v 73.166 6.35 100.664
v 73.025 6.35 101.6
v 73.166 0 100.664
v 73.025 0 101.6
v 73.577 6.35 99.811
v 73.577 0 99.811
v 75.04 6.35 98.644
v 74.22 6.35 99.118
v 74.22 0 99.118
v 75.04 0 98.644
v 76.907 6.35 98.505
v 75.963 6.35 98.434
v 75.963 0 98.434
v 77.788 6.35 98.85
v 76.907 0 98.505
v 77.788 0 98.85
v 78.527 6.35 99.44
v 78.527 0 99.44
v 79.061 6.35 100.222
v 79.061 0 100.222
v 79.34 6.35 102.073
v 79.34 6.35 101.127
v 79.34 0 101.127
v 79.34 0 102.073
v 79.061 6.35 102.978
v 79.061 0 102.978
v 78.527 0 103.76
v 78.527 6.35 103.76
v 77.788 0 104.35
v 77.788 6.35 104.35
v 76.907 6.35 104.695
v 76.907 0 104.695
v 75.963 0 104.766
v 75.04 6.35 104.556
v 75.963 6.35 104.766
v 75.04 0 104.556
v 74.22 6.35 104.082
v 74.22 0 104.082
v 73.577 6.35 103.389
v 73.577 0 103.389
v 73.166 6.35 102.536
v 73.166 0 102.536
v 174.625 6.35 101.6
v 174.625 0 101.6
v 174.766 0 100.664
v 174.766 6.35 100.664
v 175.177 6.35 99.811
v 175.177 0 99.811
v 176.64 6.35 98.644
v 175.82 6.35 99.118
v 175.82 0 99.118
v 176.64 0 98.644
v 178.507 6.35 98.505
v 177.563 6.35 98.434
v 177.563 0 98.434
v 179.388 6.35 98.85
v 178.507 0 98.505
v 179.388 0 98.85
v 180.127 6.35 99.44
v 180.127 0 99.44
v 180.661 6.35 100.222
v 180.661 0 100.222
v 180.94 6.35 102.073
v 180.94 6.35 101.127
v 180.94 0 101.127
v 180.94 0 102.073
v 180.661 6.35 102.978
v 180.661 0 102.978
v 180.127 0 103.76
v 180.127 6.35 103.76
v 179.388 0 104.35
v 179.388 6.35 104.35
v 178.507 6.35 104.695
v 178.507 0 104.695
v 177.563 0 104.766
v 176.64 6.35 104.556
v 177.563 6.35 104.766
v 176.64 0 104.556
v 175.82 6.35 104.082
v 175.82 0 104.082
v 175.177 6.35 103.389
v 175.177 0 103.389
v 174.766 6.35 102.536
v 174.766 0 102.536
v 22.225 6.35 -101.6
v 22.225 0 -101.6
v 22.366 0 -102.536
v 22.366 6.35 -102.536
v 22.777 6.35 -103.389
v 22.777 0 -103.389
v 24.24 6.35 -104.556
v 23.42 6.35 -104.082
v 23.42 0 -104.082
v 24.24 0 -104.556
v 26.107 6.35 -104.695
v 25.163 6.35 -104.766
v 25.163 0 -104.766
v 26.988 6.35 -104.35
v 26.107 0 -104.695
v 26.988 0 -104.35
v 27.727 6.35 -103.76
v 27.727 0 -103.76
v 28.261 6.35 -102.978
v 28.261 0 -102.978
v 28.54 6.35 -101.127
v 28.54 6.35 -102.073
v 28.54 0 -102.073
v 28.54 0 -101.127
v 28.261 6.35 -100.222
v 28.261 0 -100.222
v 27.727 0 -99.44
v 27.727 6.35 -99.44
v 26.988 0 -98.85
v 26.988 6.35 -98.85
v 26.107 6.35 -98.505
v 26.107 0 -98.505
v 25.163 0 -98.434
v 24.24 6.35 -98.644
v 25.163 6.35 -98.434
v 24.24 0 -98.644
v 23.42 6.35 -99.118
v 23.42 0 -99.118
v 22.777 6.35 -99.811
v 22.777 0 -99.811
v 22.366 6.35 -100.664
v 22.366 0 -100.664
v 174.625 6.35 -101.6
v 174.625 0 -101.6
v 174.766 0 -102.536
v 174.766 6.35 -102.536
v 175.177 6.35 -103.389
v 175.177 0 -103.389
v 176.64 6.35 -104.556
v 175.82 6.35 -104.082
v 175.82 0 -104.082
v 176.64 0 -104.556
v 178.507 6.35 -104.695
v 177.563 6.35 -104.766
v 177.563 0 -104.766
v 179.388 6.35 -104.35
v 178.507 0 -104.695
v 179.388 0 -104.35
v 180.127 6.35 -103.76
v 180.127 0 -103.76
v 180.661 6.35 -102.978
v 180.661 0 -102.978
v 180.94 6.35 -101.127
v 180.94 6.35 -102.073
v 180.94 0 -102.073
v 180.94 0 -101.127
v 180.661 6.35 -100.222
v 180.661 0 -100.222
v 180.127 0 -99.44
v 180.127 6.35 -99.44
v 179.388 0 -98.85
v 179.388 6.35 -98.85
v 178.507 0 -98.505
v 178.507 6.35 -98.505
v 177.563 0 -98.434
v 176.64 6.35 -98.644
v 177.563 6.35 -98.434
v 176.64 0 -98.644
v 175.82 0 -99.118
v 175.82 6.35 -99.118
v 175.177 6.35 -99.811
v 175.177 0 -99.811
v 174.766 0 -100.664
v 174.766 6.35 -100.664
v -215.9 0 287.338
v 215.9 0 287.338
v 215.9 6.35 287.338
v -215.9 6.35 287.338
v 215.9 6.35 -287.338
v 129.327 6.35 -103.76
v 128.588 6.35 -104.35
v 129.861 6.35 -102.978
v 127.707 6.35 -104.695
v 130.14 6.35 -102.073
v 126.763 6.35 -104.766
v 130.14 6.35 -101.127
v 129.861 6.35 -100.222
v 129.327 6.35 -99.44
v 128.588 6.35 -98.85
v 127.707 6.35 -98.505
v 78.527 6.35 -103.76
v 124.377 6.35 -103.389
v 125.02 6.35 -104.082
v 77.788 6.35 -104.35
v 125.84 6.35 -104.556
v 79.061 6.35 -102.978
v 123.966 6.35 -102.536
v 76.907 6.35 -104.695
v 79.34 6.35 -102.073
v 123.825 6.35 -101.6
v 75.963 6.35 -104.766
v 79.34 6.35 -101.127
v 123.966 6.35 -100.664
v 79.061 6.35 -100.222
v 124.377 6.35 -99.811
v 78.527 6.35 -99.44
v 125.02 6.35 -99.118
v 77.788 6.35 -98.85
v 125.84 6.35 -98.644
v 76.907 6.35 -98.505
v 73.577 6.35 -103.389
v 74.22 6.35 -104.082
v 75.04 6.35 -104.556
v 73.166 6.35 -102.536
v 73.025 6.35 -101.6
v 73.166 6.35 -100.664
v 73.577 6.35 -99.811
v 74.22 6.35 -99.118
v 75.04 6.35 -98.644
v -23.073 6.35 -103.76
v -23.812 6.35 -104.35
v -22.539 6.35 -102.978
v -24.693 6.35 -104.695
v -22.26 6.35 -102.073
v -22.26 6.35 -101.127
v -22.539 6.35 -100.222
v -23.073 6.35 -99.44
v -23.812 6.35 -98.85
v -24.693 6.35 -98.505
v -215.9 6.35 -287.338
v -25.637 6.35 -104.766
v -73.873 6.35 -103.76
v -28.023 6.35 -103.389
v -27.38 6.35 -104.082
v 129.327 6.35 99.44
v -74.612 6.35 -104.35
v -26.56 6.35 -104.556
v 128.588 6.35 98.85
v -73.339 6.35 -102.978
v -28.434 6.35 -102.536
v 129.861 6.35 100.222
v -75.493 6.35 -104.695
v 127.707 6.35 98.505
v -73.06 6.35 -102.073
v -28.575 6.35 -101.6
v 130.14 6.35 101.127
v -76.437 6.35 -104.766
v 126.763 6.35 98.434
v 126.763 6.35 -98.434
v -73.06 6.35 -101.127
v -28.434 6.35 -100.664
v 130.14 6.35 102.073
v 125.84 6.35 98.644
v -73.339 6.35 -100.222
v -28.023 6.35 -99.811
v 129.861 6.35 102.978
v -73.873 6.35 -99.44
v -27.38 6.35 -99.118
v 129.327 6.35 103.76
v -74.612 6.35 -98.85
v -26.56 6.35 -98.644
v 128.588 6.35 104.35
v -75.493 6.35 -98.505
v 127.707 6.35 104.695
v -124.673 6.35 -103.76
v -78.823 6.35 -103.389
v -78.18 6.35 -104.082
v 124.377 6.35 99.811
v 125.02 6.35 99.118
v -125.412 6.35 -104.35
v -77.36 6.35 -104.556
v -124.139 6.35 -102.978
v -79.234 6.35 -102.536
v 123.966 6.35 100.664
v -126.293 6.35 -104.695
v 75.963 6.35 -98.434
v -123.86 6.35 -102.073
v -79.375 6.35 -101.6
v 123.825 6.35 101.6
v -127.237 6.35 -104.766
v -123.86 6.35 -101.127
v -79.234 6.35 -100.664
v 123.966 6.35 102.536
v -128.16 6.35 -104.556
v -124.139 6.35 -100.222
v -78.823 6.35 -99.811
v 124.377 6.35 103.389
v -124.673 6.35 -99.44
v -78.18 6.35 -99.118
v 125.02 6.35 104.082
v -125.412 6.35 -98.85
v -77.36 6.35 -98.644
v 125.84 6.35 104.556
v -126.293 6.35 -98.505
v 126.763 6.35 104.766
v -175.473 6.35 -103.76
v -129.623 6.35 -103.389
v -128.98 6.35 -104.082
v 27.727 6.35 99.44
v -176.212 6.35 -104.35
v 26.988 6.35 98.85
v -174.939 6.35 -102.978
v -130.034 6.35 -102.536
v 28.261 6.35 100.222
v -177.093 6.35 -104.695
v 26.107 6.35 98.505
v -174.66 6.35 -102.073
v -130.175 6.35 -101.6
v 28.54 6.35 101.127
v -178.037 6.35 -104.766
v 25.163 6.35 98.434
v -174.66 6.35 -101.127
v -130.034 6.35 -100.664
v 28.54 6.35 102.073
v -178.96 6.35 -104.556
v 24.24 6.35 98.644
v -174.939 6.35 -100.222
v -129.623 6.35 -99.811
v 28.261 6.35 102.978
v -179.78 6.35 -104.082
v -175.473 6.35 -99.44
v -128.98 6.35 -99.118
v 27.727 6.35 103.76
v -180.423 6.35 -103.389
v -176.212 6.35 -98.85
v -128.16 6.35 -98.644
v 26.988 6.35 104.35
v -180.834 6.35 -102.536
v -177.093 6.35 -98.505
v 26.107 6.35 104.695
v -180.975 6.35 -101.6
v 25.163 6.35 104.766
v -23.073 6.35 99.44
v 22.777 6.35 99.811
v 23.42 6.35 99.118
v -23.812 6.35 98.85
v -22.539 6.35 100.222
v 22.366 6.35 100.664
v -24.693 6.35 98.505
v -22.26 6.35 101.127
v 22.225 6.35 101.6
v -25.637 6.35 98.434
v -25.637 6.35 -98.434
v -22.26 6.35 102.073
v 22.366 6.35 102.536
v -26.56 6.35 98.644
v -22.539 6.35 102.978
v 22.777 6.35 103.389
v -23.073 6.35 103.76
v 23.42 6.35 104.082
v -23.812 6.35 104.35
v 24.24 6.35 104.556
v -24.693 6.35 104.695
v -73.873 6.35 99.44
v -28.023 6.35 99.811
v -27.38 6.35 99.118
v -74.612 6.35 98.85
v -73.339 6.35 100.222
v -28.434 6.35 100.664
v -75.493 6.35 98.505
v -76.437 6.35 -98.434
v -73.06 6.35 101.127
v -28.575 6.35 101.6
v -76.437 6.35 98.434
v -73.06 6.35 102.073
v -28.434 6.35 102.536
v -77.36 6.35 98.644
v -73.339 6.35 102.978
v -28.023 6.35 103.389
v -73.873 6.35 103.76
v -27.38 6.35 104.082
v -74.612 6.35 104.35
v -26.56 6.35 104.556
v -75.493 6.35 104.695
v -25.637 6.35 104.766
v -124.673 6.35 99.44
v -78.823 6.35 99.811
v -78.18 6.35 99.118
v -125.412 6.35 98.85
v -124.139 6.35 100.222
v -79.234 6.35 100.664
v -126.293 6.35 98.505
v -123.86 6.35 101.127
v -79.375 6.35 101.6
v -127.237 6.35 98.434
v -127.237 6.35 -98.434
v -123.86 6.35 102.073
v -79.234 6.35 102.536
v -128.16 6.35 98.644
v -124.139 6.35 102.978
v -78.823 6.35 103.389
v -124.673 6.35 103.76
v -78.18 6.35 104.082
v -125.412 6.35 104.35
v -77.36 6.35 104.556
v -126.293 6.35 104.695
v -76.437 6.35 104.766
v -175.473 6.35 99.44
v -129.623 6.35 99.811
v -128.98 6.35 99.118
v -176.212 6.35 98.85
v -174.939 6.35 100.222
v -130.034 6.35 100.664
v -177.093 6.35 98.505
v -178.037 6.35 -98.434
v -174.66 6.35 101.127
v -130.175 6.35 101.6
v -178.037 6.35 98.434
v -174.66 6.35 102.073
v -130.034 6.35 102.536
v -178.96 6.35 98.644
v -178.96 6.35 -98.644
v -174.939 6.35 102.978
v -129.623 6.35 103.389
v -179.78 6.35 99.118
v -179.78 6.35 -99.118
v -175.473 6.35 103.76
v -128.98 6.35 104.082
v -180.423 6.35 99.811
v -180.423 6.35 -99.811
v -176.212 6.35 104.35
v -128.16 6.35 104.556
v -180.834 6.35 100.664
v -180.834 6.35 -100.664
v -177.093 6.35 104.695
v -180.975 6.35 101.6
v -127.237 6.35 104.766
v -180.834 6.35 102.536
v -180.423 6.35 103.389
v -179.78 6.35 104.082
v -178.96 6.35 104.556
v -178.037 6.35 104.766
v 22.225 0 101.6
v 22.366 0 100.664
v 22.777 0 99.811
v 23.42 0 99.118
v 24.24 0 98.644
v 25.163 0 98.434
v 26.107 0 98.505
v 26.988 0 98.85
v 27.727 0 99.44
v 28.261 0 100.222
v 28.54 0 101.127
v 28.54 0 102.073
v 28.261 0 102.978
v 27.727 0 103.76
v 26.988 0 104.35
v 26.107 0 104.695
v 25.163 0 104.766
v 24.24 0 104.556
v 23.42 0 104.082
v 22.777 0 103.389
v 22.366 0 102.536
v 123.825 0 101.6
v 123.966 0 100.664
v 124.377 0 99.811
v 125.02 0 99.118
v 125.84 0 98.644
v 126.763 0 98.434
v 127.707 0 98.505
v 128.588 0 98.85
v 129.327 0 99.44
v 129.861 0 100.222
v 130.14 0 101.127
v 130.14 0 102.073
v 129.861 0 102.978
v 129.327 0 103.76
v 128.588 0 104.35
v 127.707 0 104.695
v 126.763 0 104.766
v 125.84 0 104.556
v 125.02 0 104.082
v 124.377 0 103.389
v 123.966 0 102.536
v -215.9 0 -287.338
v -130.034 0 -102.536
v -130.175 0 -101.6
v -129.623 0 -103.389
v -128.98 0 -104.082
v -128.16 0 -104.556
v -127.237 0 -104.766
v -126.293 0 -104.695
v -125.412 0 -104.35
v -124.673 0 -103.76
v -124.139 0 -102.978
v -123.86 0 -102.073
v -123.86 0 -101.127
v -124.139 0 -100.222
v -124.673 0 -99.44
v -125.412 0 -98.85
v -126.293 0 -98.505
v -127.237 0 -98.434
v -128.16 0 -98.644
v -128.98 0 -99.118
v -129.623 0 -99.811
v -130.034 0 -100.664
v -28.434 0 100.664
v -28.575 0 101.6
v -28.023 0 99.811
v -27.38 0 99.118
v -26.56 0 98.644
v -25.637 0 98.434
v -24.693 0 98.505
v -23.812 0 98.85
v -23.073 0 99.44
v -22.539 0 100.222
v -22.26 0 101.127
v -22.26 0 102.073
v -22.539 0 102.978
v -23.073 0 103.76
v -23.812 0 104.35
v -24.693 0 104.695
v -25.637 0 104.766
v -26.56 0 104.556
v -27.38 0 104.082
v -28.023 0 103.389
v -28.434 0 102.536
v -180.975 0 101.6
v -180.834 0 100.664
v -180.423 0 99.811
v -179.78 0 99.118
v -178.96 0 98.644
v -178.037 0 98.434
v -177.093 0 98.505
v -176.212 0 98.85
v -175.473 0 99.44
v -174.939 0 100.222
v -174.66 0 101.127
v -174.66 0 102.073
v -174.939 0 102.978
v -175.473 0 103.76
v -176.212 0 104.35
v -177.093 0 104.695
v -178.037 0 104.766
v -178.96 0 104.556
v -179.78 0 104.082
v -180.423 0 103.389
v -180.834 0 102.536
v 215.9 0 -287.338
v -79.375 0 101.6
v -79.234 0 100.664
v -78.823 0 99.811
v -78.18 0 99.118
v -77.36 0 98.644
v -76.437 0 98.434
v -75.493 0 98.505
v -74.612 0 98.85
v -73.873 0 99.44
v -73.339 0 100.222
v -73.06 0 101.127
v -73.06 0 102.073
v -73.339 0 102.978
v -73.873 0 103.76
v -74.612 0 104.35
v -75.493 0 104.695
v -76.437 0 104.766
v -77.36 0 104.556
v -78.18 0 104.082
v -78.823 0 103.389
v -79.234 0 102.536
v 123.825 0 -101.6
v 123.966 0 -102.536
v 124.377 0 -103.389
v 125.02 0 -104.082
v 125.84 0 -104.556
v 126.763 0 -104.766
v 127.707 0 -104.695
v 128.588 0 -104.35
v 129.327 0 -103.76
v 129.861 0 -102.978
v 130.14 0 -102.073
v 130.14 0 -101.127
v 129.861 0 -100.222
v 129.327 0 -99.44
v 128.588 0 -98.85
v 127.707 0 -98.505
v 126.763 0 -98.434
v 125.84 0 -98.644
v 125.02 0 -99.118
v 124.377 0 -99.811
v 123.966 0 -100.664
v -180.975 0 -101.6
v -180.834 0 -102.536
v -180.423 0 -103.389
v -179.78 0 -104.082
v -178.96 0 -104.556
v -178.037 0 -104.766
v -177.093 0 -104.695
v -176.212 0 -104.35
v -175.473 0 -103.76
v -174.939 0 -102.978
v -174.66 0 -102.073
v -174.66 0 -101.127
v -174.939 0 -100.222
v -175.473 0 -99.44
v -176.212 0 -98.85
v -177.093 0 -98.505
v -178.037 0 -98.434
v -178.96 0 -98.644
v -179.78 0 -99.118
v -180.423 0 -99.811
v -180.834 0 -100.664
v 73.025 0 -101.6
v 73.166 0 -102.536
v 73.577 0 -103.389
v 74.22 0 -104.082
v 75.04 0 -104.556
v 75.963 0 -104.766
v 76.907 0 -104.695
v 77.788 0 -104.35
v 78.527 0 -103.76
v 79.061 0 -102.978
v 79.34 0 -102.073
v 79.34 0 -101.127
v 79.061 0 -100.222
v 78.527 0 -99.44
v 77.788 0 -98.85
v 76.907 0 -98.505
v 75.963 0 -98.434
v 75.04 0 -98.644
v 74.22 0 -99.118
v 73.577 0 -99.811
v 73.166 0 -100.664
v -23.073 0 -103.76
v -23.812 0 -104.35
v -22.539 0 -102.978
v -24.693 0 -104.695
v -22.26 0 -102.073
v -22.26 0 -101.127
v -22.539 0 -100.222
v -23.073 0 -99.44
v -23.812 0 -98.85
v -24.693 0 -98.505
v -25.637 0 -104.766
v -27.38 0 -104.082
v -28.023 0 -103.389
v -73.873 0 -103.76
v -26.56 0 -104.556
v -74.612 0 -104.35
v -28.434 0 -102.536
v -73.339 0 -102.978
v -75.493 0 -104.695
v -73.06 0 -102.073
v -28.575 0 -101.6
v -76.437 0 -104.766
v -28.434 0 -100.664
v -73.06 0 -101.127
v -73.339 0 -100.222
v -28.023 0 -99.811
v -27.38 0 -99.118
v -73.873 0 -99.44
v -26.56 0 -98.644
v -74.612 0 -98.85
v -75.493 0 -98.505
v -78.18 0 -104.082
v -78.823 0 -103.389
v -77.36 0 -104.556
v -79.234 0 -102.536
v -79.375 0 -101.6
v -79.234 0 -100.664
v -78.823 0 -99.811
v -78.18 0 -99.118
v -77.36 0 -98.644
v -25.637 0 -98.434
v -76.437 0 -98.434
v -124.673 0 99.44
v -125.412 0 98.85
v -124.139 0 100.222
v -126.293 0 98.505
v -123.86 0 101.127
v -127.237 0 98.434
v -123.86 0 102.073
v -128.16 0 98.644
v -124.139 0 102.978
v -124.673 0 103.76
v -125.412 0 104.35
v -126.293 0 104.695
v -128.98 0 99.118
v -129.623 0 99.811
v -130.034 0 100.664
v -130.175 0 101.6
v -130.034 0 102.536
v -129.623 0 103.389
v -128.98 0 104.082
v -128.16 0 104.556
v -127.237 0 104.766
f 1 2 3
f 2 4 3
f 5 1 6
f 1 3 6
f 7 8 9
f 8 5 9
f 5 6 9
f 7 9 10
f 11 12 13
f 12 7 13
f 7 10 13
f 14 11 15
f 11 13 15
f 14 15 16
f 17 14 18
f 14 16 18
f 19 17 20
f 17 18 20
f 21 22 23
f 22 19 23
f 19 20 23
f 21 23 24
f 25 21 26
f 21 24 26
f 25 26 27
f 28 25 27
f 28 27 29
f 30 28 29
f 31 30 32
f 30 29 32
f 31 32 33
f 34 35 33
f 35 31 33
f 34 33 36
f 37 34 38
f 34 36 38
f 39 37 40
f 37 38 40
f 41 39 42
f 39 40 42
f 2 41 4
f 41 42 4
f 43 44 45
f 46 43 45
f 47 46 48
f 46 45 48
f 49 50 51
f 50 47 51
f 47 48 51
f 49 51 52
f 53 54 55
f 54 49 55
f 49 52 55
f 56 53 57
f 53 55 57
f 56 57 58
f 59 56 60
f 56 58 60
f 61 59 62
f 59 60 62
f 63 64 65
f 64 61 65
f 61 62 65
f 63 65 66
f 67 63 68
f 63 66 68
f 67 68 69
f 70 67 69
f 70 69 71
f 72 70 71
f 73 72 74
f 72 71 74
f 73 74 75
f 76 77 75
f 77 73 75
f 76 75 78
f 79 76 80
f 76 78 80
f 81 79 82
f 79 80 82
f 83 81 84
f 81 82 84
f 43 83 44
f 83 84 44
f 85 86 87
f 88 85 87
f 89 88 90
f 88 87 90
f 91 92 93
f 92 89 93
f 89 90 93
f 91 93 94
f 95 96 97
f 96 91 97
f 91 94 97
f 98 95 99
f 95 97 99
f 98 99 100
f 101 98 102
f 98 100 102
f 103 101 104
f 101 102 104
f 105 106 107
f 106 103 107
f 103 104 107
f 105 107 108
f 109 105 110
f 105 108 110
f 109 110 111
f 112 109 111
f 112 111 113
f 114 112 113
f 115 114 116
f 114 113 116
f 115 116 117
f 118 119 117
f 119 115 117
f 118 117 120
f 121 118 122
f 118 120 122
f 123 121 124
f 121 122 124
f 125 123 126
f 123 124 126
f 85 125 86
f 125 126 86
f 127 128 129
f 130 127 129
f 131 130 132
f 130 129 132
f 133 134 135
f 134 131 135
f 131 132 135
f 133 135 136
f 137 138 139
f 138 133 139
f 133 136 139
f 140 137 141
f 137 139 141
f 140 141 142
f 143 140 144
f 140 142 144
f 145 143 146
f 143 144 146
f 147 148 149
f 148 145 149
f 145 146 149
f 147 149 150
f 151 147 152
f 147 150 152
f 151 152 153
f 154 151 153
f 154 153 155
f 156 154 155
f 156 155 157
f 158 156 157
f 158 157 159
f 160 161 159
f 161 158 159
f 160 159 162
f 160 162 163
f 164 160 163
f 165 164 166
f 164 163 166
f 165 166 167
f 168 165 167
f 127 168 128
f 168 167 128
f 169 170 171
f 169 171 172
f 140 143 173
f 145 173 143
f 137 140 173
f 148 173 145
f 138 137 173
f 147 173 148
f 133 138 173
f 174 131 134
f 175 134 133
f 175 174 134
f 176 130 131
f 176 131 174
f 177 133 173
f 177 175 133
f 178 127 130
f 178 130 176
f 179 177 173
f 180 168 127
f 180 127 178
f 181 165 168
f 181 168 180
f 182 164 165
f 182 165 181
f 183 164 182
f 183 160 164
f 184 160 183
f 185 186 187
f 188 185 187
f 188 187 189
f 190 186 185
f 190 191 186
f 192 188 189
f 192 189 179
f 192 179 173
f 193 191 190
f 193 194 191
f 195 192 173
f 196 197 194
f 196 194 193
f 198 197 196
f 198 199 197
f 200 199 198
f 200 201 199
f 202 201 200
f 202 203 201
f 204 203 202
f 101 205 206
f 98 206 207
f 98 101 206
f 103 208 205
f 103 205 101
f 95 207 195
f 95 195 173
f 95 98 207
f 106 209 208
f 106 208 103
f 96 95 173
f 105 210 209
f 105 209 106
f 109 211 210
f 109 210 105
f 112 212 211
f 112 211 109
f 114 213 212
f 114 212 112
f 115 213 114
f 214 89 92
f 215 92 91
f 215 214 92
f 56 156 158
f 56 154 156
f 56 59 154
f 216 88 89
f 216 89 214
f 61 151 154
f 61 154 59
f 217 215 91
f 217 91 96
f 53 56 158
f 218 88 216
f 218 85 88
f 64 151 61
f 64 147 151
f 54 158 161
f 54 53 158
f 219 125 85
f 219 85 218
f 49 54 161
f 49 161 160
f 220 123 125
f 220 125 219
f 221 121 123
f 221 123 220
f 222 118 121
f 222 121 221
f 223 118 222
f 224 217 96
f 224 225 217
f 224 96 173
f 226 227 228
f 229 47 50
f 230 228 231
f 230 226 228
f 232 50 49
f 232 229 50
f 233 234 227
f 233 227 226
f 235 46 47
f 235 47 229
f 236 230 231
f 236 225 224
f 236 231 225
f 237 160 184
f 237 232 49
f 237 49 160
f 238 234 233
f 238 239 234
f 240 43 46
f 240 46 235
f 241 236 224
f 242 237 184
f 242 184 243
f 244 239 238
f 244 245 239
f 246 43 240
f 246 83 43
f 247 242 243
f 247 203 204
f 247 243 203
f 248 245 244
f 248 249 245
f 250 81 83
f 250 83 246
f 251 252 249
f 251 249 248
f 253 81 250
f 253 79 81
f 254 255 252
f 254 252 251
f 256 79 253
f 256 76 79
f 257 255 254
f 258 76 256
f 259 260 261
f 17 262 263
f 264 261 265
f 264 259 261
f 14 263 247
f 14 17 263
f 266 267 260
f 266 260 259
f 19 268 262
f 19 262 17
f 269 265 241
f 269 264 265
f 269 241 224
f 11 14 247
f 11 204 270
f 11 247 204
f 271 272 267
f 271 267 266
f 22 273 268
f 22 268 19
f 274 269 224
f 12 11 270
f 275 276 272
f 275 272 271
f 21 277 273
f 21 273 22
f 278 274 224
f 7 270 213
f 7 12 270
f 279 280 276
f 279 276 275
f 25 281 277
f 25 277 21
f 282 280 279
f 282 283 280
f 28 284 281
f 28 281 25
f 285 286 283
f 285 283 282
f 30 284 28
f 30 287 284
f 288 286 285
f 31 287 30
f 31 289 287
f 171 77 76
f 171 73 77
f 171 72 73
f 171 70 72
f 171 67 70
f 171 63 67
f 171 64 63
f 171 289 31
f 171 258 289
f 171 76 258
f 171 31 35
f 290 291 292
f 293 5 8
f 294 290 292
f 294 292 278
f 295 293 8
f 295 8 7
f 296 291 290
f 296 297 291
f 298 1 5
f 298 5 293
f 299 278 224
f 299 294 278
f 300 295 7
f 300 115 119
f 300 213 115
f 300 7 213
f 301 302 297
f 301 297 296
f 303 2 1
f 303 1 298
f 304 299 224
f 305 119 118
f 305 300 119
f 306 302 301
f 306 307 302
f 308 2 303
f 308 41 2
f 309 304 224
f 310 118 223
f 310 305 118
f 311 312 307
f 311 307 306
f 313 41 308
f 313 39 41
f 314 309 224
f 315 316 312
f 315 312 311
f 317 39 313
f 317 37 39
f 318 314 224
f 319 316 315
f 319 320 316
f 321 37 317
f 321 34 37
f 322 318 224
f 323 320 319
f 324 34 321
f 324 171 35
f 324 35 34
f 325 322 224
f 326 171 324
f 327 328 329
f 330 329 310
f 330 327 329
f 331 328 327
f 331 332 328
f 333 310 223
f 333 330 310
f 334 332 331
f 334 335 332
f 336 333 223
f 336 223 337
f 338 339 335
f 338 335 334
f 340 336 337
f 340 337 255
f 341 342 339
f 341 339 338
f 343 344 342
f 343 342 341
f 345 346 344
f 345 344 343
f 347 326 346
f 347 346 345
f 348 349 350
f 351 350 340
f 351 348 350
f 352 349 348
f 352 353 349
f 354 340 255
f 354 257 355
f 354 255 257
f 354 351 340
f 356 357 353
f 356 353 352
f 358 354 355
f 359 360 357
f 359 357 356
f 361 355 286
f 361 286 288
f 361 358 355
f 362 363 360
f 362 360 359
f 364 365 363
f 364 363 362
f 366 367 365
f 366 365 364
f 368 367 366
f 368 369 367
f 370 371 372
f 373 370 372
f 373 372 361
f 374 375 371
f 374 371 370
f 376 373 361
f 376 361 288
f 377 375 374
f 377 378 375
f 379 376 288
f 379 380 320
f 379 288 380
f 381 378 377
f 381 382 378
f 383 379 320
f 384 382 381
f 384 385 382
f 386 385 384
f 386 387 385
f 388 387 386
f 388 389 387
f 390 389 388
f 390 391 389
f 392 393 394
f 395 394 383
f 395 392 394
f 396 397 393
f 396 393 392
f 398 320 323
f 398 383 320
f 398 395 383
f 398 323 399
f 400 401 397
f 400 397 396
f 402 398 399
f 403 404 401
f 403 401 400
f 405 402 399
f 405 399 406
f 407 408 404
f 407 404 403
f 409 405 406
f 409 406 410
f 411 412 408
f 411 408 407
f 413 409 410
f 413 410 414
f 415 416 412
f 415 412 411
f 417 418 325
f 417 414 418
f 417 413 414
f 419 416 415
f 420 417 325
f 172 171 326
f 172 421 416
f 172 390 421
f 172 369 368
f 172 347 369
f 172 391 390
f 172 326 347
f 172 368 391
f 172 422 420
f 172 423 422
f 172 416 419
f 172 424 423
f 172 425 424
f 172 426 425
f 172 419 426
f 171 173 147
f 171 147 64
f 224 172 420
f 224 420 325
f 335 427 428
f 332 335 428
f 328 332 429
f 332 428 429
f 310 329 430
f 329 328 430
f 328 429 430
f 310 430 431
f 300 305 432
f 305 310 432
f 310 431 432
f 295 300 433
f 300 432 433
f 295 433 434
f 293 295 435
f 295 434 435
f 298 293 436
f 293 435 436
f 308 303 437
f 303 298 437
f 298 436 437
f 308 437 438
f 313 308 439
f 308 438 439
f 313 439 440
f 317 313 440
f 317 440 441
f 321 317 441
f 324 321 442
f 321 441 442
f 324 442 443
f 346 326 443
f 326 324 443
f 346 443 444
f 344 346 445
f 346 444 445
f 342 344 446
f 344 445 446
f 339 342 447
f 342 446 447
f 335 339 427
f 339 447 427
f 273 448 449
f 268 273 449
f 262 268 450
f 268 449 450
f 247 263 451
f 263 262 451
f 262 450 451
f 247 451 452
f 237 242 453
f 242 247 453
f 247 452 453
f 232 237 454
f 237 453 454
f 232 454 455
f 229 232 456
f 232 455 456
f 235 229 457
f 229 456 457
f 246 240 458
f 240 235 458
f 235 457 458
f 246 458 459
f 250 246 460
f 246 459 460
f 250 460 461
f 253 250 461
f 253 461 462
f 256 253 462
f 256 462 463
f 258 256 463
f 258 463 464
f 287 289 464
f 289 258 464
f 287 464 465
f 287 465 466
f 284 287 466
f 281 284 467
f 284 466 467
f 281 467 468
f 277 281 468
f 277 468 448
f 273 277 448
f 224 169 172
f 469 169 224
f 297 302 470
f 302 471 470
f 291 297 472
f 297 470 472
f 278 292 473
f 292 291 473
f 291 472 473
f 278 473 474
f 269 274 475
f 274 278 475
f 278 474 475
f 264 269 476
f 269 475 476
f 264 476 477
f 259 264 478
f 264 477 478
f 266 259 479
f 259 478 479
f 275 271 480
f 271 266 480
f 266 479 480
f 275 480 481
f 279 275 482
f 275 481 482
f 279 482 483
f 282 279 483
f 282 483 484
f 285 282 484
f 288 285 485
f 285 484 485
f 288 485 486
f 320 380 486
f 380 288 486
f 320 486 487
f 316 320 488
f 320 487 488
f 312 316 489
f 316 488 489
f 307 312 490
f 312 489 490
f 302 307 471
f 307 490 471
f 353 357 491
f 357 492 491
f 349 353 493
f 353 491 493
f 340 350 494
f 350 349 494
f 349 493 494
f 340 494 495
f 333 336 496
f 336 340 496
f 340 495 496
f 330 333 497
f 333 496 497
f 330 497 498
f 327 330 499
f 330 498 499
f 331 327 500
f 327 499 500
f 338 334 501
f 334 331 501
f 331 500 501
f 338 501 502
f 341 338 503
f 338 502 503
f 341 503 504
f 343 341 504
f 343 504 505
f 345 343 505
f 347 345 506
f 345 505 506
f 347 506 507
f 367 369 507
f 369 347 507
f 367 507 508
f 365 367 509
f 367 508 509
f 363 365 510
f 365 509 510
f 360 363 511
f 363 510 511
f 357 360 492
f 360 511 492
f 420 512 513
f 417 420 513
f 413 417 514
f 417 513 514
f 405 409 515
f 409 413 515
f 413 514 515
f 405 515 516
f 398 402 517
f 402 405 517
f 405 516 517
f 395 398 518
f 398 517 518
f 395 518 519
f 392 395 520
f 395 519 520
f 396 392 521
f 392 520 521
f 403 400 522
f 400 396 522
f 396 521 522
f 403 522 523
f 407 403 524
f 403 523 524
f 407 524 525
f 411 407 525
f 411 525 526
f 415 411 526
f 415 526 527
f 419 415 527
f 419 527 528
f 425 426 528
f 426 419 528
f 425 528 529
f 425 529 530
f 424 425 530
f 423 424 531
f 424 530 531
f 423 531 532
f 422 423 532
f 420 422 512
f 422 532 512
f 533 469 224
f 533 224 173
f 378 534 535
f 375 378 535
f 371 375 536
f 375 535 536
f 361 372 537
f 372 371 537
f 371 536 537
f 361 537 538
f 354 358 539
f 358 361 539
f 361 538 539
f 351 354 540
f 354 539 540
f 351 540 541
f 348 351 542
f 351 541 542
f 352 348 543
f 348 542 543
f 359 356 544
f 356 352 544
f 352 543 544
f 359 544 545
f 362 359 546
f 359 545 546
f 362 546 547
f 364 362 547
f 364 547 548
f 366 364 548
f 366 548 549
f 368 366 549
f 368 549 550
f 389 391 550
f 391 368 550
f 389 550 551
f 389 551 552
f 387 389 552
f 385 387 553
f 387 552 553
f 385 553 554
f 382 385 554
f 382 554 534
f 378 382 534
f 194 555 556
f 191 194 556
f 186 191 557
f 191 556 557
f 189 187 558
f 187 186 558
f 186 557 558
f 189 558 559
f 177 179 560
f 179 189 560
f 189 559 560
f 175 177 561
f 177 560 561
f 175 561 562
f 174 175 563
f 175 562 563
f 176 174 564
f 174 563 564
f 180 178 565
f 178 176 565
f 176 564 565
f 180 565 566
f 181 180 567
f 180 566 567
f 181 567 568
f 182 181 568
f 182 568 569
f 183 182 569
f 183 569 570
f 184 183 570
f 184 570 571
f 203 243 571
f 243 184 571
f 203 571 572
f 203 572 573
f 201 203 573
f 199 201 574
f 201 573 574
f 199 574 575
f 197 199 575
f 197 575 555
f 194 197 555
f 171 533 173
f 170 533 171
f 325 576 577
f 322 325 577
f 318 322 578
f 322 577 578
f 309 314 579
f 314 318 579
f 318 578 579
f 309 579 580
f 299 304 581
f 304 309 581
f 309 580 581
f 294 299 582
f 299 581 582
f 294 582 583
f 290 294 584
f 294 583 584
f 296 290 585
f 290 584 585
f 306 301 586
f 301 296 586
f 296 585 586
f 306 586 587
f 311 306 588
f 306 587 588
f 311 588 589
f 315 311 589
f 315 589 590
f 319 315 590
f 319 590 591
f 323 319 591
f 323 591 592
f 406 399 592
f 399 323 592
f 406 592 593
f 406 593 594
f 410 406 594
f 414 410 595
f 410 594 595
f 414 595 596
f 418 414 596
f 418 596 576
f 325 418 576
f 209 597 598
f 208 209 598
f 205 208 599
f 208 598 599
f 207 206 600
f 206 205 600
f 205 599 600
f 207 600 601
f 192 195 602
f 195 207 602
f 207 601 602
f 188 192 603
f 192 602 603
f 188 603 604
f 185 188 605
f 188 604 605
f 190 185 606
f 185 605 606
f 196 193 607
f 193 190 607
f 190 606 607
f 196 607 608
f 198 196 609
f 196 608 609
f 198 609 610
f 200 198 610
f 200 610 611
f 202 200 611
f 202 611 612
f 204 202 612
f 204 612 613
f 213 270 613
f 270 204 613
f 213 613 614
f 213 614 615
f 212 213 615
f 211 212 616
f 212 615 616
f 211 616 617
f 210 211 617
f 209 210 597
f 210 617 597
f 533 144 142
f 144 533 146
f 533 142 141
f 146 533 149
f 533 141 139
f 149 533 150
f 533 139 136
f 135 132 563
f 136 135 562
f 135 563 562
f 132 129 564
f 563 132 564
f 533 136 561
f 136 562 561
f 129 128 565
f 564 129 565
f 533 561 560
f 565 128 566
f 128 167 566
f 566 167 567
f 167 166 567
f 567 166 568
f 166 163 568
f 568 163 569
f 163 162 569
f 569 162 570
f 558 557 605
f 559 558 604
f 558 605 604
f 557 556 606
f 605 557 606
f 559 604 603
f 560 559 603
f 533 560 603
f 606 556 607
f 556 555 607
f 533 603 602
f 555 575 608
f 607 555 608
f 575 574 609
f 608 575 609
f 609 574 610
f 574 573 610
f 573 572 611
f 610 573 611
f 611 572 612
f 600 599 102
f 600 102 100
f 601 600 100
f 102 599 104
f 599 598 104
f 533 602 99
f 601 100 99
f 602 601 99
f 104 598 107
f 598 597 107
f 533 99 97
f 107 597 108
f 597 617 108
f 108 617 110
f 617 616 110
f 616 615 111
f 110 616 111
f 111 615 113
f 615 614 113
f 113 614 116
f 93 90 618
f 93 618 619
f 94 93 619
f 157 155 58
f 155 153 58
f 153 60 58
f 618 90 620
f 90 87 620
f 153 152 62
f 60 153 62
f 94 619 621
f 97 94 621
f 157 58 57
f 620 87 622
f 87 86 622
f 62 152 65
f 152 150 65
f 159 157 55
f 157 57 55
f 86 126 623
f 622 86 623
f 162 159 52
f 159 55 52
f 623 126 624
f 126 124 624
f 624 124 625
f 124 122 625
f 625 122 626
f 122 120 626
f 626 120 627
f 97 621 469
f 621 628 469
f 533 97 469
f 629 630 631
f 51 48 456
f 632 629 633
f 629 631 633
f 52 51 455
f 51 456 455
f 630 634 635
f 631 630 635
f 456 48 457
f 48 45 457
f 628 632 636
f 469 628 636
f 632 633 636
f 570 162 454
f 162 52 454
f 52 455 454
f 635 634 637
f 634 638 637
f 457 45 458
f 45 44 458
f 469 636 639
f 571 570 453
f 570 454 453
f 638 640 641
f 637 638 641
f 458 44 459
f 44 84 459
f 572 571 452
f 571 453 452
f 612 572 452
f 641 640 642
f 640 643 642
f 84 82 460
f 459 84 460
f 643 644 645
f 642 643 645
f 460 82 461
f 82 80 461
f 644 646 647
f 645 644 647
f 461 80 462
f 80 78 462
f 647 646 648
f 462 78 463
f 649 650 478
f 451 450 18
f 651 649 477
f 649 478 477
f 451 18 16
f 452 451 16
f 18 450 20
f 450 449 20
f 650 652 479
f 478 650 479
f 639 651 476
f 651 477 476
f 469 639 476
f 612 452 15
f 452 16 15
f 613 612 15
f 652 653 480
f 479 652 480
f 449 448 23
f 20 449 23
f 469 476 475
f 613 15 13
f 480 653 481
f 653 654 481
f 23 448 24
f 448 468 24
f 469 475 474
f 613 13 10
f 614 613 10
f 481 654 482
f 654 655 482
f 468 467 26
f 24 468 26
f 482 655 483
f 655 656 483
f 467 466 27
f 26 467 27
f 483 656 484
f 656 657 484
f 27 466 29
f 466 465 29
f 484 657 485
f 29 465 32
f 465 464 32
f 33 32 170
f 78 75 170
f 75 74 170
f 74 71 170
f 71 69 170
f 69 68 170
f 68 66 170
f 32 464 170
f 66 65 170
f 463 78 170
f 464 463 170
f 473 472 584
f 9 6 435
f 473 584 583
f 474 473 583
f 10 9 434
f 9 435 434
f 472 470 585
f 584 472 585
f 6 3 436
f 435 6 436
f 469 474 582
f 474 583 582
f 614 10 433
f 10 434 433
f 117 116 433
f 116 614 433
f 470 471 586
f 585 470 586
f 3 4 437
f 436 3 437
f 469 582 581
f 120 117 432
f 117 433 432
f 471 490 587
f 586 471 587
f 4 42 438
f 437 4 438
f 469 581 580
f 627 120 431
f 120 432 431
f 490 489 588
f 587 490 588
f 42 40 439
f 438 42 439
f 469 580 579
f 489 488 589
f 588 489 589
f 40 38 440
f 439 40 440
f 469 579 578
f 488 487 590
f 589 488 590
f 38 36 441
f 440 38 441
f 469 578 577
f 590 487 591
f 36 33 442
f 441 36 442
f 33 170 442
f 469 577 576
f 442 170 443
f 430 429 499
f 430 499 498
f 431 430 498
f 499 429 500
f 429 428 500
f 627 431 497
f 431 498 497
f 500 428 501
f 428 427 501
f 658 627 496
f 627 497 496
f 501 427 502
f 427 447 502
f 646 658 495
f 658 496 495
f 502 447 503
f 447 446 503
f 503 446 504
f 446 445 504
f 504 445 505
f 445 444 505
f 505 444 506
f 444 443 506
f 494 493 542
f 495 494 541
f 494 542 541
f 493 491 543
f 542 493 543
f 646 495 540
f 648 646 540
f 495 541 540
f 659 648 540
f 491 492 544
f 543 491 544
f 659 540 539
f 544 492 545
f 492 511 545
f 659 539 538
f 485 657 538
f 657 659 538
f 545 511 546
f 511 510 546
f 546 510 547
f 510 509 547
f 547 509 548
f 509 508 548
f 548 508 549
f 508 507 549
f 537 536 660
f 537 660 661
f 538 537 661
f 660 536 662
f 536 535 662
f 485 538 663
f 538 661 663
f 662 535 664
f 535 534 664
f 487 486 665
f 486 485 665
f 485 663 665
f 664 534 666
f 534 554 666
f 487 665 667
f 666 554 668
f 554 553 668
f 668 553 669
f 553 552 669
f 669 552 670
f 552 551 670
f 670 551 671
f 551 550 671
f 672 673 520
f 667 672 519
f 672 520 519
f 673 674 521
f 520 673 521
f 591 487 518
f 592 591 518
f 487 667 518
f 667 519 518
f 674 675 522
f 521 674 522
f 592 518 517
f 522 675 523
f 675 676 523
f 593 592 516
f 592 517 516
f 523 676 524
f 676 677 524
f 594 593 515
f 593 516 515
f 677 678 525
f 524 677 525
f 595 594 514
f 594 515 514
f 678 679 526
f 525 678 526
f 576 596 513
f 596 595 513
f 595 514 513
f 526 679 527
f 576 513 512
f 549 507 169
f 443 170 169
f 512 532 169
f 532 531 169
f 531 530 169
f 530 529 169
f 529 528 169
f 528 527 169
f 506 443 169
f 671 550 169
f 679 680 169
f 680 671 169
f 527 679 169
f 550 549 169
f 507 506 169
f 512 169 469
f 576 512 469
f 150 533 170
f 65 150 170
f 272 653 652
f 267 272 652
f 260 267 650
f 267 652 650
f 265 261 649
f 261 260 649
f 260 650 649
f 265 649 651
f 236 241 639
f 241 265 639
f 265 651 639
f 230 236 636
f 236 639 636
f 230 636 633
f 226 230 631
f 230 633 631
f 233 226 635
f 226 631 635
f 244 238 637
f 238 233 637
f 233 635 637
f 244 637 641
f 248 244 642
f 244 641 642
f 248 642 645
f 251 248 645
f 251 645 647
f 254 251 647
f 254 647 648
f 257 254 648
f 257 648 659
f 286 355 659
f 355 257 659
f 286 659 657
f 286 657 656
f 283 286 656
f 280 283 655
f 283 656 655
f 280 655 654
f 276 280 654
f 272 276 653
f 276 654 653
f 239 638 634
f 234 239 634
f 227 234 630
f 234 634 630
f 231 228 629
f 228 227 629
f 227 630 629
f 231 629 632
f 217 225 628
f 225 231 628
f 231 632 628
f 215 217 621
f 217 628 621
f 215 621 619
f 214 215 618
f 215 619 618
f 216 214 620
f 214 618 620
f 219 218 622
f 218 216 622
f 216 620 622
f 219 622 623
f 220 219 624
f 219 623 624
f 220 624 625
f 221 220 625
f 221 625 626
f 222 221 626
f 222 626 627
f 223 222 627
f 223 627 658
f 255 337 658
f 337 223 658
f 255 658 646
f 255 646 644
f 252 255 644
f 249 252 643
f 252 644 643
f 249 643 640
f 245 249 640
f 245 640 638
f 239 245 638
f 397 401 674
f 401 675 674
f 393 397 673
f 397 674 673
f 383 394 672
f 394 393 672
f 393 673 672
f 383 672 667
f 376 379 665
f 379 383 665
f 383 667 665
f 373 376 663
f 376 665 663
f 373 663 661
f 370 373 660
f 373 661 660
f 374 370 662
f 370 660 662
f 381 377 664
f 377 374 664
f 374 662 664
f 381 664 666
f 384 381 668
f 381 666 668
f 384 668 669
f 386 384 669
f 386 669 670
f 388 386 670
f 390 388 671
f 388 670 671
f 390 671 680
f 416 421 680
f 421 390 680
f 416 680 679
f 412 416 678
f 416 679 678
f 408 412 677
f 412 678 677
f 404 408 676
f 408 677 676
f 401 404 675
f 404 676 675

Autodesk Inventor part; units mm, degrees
ref_plane "YZ Plane" through (0, 0, 0) normal (1, 0, 0) x (0, 1, 0)
ref_plane "XZ Plane" through (0, 0, 0) normal (0, 1, 0) x (-1, 0, 0)
ref_plane "XY Plane" through (0, 0, 0) normal (0, 0, 1) x (1, 0, 0)
sketch "Sketch1" plane through (0, 0, 0) normal (0, 1, 0) x (-1, 0, 0)
  line L0 (-215.9, 287.3375) -> (215.9, 287.3375)
  line L1 (215.9, 287.3375) -> (215.9, -287.3375)
  line L2 (215.9, -287.3375) -> (-215.9, -287.3375)
  line L3 (-215.9, -287.3375) -> (-215.9, 287.3375)
  line L4 (-215.9, 287.3375) -> (215.9, -287.3375) construction
  line L5 (215.9, 287.3375) -> (-215.9, -287.3375) construction
  line L6 (330.2, 88.9) -> (-330.2, 88.9) construction
  line L7 (-330.2, 88.9) -> (-330.2, 114.3) construction
  line L8 (-330.2, 114.3) -> (330.2, 114.3) construction
  line L9 (330.2, 114.3) -> (330.2, 88.9) construction
  circle A0 centre (228.6, 101.6) radius 3.175
  line L10 (330.2, 101.6) -> (228.6, 101.6) construction
  line L11 (215.9, 0) -> (-215.9, 0) construction
  circle A1 centre (177.8, 101.6) radius 3.175
  circle A2 centre (127, 101.6) radius 3.175
  circle A3 centre (76.2, 101.6) radius 3.175
  circle A4 centre (25.4, 101.6) radius 3.175
  circle A5 centre (-25.4, 101.6) radius 3.175
  circle A6 centre (-76.2, 101.6) radius 3.175
  circle A7 centre (-127, 101.6) radius 3.175
  circle A8 centre (-177.8, 101.6) radius 3.175
  circle A9 centre (-228.6, 101.6) radius 3.175
  line L12 (330.2, -88.9) -> (-330.2, -88.9) construction
  line L13 (-330.2, -88.9) -> (-330.2, -114.3) construction
  line L14 (-330.2, -114.3) -> (330.2, -114.3) construction
  line L15 (330.2, -114.3) -> (330.2, -88.9) construction
  circle A10 centre (228.6, -101.6) radius 3.175
  circle A11 centre (177.8, -101.6) radius 3.175
  circle A12 centre (127, -101.6) radius 3.175
  circle A13 centre (76.2, -101.6) radius 3.175
  circle A14 centre (25.4, -101.6) radius 3.175
  circle A15 centre (-25.4, -101.6) radius 3.175
  circle A16 centre (-76.2, -101.6) radius 3.175
  circle A17 centre (-127, -101.6) radius 3.175
  circle A18 centre (-177.8, -101.6) radius 3.175
  circle A19 centre (-228.6, -101.6) radius 3.175
  point P0 (0, 0)
  point P1 (-330.2, 101.6)
  dimension "d0" = 431.8
  dimension "d4" = 25.4
  dimension "d7" = 114.3
  dimension "d8" = 6.35
  dimension "d9" = 101.6
  dimension "d10" = 660.4
  dimension "d11" = 330.2
  dimension "d16" = 50.8
  dimension "d22" = 173.0375
extrude "Extrusion1" add sketch "Sketch1" along normal blind 6.35 contours L0 L1 L2 L3
equation "\"d7\" = 0.5 * d6"
equation "\"d11\" = 0.5 * d10"
equation "\"d6\" = 228.6"
properties part number "MotorAttachementPlate"
